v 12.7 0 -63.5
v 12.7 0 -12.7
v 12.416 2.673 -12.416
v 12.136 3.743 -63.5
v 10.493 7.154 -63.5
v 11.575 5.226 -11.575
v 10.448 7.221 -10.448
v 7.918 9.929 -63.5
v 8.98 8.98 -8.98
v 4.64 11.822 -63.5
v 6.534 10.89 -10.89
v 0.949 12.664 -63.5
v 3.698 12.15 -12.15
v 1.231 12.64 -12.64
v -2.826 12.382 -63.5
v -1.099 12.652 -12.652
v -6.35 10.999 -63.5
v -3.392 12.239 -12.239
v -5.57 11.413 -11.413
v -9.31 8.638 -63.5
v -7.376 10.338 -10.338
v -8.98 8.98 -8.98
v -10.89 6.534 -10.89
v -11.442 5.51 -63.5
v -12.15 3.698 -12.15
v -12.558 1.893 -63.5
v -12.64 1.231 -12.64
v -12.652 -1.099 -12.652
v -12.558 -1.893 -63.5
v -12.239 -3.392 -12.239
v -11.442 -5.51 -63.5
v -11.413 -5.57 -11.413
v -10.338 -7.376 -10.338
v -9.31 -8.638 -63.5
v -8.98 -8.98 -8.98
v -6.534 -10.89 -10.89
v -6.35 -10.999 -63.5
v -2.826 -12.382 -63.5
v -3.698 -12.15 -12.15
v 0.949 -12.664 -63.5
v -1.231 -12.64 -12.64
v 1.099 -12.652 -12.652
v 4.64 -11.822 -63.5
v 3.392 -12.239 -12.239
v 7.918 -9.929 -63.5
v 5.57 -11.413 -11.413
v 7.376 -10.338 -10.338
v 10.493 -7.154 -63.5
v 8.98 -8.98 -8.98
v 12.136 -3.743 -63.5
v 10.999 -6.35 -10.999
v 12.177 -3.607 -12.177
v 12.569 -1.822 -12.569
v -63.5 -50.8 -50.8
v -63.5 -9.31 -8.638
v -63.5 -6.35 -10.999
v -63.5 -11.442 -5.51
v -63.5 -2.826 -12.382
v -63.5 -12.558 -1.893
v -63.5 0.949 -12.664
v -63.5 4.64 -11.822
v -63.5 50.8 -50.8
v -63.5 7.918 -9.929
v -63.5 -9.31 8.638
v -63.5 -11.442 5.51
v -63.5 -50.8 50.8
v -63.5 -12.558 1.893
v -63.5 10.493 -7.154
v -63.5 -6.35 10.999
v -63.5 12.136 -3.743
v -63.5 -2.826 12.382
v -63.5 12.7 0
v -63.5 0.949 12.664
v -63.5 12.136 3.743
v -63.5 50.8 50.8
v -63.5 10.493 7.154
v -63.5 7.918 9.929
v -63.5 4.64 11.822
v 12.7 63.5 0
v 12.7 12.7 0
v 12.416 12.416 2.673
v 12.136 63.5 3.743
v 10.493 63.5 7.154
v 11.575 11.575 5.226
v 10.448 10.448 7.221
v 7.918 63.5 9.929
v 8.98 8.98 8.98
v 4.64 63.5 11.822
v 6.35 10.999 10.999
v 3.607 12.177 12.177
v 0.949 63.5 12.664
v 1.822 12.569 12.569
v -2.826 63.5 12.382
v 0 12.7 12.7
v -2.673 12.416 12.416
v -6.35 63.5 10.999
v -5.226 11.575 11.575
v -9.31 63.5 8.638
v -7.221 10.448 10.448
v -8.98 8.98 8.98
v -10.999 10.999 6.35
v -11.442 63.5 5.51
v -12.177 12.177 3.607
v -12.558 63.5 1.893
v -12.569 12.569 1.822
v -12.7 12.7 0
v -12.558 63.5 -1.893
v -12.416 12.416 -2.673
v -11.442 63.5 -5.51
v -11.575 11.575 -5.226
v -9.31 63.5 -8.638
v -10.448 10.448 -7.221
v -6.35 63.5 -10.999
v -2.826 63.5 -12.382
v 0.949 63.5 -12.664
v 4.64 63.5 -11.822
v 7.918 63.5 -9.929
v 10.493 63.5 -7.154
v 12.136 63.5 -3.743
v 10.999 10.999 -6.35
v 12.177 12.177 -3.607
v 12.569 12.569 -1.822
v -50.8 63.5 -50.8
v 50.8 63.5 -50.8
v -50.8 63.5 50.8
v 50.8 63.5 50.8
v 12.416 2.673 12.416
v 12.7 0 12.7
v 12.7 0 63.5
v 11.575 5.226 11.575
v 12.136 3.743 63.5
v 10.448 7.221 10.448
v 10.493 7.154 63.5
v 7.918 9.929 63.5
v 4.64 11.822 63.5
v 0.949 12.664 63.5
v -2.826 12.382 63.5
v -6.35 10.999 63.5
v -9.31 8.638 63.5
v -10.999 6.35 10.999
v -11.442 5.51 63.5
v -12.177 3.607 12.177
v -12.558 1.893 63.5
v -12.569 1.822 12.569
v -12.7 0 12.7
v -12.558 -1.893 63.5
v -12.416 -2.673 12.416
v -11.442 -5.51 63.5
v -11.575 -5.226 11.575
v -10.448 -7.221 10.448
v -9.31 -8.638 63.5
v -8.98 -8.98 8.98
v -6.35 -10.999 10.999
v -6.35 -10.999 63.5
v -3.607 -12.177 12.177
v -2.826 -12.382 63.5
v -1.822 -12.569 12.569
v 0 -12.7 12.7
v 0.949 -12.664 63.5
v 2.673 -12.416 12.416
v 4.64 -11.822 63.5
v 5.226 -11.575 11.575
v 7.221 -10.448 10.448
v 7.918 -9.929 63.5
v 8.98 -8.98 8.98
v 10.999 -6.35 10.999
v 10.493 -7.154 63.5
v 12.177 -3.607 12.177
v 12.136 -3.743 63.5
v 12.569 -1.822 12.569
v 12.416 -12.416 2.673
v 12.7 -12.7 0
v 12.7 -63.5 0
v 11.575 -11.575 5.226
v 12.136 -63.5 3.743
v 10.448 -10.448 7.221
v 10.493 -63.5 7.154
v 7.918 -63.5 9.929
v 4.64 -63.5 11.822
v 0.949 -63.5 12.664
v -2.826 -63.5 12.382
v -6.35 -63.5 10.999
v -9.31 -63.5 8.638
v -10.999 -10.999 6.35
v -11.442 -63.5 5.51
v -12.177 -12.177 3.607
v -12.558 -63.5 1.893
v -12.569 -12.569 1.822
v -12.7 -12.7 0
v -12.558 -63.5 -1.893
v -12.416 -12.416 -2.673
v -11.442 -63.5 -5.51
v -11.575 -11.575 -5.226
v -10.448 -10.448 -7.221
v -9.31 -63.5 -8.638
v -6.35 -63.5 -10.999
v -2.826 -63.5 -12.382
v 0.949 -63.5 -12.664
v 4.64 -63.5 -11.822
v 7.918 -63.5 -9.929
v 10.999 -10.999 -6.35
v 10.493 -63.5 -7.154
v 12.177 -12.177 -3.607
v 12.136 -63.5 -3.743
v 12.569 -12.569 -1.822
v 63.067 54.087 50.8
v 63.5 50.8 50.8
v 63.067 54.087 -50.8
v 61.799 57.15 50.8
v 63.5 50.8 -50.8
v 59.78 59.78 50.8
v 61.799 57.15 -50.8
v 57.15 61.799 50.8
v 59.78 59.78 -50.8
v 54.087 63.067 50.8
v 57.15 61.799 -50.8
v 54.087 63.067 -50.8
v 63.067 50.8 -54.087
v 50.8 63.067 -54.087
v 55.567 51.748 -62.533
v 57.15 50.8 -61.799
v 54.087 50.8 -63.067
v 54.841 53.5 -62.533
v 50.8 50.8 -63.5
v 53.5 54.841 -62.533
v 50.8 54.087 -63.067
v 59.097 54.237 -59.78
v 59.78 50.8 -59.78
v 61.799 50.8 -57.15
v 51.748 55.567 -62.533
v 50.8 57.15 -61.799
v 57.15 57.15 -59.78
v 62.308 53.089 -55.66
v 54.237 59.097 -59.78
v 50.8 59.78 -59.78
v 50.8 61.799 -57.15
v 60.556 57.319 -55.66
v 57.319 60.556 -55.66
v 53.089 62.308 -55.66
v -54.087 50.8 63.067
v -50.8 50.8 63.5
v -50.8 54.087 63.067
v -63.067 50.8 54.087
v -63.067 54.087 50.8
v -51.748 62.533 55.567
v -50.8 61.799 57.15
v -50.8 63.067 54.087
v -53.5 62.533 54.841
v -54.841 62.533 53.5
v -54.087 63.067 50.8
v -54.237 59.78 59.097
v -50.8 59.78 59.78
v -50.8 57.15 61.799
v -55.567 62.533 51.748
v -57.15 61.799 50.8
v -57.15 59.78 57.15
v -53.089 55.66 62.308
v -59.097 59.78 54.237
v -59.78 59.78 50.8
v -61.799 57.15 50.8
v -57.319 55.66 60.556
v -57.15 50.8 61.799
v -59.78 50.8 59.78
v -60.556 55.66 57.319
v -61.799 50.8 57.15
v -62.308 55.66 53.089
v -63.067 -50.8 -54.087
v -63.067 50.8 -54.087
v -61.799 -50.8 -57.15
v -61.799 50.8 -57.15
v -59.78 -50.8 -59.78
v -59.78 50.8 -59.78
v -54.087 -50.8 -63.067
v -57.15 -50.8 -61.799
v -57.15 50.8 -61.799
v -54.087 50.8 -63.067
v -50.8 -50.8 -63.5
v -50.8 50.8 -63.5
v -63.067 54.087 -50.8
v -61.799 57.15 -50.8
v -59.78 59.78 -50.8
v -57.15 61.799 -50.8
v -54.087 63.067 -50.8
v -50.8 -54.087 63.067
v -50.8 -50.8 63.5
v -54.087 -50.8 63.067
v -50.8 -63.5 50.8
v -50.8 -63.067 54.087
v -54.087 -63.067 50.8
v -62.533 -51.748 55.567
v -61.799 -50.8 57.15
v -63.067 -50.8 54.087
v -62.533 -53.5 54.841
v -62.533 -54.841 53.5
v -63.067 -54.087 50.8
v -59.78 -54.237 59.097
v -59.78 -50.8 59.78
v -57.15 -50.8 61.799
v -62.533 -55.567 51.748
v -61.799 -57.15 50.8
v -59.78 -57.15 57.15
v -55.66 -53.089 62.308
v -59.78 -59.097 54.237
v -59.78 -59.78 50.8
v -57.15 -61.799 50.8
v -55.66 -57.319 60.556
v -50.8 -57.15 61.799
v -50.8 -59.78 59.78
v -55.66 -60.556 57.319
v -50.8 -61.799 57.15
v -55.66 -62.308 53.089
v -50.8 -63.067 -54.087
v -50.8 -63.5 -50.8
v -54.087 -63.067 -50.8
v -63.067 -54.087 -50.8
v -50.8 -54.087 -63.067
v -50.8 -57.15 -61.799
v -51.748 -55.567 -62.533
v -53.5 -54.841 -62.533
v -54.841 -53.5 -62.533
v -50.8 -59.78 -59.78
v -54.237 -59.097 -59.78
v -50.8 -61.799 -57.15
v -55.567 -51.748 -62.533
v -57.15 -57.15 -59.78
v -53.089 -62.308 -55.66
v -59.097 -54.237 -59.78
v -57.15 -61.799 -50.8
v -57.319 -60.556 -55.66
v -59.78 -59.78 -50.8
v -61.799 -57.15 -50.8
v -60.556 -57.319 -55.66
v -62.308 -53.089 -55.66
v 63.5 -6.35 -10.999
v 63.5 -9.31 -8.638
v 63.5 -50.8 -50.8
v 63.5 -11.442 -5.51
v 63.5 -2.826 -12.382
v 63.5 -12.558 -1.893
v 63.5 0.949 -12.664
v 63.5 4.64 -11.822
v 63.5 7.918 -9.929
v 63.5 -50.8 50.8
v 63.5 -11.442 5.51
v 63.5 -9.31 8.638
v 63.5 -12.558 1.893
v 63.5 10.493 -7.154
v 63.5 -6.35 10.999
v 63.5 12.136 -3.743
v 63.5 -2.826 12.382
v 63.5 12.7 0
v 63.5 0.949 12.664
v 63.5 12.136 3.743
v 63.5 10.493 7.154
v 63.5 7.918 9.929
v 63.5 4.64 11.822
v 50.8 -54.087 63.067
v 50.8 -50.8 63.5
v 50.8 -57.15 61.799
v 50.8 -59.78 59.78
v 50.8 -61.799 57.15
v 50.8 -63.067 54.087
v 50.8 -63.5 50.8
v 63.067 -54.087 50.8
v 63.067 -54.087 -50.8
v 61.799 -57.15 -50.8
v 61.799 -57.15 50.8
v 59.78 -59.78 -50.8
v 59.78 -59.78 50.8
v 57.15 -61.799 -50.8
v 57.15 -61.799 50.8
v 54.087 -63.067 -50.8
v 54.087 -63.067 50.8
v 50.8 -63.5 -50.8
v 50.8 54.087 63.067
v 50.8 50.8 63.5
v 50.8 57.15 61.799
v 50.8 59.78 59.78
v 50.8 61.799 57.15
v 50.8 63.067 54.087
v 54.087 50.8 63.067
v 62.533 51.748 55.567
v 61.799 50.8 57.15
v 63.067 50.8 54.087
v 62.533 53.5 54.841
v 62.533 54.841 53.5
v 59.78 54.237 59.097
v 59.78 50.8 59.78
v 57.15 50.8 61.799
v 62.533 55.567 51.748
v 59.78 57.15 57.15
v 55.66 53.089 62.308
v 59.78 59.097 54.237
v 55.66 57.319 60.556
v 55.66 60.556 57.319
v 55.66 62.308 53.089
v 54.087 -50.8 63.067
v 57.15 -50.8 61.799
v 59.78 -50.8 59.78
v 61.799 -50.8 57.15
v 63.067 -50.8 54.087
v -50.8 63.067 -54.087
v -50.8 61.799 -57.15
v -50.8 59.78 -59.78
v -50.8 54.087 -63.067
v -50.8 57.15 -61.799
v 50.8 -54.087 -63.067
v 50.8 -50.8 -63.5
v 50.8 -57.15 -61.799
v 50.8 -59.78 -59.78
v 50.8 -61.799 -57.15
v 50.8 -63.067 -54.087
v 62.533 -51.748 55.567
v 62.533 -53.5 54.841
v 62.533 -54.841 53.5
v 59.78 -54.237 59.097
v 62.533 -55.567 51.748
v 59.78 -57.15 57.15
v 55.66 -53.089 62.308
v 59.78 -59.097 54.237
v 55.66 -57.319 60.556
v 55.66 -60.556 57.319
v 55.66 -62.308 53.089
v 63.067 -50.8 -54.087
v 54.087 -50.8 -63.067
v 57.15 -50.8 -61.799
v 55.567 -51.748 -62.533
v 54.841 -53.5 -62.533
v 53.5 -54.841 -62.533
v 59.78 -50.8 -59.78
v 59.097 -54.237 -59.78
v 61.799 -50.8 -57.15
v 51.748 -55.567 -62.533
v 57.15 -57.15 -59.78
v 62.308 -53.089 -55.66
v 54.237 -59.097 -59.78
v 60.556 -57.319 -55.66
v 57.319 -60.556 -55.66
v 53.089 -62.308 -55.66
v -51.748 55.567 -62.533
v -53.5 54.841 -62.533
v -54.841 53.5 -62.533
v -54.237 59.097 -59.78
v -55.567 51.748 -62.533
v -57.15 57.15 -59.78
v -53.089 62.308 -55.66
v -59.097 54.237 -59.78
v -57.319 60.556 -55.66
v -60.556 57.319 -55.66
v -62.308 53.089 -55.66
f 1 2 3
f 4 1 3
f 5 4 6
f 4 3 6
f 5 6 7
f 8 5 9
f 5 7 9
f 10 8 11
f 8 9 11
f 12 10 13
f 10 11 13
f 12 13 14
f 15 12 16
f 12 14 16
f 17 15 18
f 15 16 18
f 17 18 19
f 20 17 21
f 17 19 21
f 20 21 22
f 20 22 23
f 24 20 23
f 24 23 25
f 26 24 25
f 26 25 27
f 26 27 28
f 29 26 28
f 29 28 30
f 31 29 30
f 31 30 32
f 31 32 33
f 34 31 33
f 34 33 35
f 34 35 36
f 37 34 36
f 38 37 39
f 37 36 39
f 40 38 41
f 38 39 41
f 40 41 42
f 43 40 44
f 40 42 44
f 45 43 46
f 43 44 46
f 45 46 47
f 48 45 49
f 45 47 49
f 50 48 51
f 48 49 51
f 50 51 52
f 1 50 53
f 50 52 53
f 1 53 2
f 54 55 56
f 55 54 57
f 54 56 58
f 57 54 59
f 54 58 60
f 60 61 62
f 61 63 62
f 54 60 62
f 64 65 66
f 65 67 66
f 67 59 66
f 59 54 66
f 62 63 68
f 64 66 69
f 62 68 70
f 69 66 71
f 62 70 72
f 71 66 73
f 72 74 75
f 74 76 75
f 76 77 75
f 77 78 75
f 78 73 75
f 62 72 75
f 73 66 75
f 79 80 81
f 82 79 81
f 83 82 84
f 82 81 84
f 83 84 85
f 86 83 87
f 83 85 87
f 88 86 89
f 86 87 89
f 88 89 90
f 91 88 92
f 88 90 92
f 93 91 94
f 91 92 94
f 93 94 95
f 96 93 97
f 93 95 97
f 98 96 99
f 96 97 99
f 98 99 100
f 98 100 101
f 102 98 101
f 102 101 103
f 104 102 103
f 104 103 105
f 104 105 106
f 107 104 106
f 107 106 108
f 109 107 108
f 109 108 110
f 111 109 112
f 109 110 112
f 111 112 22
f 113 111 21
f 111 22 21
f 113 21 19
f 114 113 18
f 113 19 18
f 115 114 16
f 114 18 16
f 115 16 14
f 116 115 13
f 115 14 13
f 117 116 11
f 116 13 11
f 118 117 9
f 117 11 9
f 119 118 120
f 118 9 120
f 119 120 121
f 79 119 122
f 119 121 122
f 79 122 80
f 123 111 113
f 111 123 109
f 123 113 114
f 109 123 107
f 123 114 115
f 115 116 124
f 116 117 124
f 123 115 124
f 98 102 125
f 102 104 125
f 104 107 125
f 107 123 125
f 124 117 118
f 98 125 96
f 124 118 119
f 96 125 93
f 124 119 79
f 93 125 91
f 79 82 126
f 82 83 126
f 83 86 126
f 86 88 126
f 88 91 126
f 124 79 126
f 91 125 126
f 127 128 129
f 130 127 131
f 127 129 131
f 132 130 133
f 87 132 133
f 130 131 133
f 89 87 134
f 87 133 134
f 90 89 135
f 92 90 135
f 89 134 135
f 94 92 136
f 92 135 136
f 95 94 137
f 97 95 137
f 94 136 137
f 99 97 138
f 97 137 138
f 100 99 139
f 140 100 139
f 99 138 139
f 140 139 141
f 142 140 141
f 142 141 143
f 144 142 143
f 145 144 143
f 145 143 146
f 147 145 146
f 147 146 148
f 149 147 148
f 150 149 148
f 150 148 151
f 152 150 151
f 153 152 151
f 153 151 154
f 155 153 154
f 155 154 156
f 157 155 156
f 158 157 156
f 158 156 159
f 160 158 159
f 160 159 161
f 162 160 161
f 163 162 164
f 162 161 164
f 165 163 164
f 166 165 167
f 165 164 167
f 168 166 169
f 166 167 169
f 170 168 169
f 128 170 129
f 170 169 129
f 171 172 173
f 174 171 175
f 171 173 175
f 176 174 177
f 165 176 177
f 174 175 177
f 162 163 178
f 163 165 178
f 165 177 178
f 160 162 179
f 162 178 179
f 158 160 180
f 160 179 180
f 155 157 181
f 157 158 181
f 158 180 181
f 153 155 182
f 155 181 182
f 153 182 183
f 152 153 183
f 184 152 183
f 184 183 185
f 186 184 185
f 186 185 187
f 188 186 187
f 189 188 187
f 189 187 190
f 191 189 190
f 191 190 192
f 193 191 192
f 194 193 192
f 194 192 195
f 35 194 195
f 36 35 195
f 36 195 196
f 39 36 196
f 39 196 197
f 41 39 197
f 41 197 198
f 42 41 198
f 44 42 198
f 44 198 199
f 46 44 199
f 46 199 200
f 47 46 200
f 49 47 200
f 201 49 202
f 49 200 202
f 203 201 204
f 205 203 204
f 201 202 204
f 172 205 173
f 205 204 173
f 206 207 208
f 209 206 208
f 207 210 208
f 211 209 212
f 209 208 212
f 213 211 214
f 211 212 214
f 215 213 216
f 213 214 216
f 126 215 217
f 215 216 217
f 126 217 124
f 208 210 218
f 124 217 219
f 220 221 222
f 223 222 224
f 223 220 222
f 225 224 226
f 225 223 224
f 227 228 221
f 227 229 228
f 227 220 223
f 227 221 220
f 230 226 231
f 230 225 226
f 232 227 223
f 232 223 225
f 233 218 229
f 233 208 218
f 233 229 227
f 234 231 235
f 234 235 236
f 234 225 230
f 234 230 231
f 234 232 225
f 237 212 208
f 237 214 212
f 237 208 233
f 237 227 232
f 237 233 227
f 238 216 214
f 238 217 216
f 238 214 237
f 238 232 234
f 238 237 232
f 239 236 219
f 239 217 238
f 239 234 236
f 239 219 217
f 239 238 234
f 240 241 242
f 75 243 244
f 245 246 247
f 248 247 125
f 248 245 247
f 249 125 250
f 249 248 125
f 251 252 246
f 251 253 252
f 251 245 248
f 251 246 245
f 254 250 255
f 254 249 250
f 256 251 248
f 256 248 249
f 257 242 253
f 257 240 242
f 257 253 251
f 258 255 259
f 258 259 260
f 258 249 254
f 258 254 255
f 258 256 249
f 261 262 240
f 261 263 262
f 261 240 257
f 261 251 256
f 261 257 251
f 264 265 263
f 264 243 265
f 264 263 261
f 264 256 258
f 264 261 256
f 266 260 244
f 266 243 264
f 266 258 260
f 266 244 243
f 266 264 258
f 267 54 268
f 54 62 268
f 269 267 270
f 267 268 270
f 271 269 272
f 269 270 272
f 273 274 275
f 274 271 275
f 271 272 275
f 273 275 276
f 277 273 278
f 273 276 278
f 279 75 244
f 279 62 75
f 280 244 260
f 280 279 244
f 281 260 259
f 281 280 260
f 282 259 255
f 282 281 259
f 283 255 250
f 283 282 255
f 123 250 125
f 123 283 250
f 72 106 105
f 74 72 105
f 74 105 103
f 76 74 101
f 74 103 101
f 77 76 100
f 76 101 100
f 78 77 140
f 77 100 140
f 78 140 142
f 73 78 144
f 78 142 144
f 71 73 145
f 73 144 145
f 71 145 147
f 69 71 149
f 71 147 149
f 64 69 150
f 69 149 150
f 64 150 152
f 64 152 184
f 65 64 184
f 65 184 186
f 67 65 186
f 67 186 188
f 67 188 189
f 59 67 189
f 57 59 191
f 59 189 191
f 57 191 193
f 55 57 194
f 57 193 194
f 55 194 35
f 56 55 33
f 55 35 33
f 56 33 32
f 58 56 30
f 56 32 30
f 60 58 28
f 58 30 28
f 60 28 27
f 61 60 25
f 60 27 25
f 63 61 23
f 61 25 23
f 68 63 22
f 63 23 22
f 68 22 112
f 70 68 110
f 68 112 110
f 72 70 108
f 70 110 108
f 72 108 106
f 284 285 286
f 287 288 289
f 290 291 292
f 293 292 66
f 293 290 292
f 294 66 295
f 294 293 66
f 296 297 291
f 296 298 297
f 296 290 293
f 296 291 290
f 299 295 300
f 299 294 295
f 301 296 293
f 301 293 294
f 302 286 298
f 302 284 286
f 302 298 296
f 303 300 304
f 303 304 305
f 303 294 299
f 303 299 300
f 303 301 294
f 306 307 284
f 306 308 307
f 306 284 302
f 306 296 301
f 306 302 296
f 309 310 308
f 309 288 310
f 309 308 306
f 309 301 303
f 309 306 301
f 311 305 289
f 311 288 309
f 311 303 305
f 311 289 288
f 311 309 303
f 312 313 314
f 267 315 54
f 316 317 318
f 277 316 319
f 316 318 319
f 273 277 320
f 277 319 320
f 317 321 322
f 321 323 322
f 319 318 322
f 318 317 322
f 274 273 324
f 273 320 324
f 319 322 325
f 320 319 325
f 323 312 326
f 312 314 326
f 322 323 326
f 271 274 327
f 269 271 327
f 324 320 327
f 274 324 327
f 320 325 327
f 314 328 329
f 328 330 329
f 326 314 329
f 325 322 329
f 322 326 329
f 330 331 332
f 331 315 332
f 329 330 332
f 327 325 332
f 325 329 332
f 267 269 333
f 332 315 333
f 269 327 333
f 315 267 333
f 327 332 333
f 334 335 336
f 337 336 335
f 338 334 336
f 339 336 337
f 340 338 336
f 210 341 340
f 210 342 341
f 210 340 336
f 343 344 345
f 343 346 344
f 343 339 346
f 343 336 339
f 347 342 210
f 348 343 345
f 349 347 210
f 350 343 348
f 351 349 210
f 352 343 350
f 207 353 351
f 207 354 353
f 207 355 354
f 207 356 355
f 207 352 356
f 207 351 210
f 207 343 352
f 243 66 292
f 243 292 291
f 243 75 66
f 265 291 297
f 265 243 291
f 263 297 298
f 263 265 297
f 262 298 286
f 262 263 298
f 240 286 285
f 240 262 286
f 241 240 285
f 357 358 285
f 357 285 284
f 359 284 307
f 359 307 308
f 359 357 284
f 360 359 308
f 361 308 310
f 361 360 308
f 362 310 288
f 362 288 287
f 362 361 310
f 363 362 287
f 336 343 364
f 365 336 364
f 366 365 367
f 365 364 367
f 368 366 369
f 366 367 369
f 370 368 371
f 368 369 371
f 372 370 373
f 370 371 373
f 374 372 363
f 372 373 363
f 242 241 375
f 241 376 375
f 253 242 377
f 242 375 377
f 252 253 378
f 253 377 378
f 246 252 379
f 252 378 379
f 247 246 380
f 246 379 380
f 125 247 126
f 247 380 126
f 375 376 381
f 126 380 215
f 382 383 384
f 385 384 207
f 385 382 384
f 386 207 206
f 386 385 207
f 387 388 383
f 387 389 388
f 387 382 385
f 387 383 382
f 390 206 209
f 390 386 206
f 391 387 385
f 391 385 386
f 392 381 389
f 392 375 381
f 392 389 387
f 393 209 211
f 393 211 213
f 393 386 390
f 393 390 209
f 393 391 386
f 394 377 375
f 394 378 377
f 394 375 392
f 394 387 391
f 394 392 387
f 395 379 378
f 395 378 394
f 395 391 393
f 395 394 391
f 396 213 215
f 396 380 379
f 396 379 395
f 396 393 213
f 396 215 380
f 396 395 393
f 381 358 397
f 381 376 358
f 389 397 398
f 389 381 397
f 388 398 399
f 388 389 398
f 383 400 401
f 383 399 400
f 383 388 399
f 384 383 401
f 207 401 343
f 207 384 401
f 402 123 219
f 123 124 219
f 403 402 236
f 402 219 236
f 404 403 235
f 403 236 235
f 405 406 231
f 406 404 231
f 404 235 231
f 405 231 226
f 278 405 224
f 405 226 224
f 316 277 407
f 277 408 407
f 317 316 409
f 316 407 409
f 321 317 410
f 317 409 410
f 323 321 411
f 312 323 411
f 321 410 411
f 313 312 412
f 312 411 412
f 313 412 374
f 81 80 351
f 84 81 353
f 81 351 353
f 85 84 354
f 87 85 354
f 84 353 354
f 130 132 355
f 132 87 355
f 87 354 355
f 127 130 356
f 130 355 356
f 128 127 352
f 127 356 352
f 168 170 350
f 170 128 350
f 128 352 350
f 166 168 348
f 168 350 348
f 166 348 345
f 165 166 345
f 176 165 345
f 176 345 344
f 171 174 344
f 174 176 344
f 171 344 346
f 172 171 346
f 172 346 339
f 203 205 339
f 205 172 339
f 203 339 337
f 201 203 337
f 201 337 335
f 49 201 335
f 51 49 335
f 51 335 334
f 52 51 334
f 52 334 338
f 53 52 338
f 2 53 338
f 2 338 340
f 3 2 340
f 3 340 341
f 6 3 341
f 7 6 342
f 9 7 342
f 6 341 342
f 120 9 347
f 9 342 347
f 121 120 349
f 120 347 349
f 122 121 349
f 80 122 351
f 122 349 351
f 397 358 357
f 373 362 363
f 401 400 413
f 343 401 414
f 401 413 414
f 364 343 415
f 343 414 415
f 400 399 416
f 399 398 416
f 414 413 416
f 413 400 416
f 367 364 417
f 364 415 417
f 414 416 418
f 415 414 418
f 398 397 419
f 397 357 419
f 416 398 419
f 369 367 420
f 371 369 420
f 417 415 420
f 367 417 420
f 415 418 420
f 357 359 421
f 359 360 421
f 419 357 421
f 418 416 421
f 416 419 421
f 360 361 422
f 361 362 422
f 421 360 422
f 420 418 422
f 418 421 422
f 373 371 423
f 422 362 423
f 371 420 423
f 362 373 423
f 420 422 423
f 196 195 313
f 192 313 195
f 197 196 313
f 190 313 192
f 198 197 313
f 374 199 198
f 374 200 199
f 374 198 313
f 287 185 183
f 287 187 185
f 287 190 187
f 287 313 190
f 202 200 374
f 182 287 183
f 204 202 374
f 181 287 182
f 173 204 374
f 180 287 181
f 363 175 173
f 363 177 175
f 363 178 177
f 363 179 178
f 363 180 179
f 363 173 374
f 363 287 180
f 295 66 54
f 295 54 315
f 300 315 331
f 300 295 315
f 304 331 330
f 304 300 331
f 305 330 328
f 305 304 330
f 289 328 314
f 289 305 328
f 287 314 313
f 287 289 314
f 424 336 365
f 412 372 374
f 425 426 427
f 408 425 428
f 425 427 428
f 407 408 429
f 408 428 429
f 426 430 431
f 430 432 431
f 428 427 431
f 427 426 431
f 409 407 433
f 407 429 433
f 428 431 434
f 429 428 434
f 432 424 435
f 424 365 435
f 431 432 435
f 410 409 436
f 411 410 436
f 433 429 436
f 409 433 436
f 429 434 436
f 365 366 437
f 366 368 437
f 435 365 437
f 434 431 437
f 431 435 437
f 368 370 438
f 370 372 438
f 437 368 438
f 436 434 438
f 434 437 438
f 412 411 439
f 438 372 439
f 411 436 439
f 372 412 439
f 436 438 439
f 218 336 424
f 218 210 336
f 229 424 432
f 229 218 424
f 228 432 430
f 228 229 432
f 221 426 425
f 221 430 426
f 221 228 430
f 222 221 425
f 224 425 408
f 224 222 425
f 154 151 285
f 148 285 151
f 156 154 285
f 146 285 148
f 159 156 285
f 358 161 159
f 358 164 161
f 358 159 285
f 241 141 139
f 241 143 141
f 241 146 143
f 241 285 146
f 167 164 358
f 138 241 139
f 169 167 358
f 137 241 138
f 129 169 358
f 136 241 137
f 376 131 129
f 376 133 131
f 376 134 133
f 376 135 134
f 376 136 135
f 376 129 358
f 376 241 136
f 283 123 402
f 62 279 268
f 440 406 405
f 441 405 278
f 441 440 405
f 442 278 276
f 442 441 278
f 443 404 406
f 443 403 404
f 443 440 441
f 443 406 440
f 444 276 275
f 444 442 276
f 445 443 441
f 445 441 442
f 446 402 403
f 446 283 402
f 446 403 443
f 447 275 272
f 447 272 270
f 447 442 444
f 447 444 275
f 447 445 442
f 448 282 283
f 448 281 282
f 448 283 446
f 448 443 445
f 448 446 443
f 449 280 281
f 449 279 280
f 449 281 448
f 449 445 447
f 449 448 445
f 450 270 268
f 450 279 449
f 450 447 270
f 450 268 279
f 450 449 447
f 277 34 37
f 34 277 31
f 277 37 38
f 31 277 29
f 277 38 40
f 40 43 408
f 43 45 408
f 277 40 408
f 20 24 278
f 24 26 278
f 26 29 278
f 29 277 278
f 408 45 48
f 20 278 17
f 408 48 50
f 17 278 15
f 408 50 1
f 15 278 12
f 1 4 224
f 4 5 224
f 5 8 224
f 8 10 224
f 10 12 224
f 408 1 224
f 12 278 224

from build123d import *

# Parameters (mm, degrees)
F0_W     = 127
F0_H     = 127
F1_DEPTH = 63.5
F2_DEPTH = 63.5
F3_R     = 12.7
F4_R     = 12.7
F5_DEPTH = 127
F6_R     = 12.7
F7_DEPTH = 127
F8_R     = 12.7
F9_DEPTH = 381


with BuildPart() as f1:
    # F0 (on Top) → F1 (new body)
    with BuildSketch(Plane.XY):
        Rectangle(F0_W, F0_H)
    extrude(amount=F1_DEPTH)

    # F2 (add): faces of the model
    f2_faces = [f1.faces().sort_by_distance(p)[0] for p in [
        (0, 0, 0),
        (0, 0, 63.5),
    ]]
    extrude(f2_faces, amount=F2_DEPTH, dir=(0, 0, -1))

    # F3
    f3_edges = [f1.edges().sort_by_distance(p)[0] for p in [
        (0, -63.5, 63.5),
        (-63.5, 0, 63.5),
        (-63.5, -63.5, 0),
        (0, 63.5, 63.5),
        (63.5, 0, 63.5),
        (63.5, 63.5, 0),
        (63.5, -63.5, 0),
        (63.5, 0, -63.5),
        (0, -63.5, -63.5),
        (-63.5, 63.5, 0),
        (0, 63.5, -63.5),
        (-63.5, 0, -63.5),
    ]]
    fillet(f3_edges, radius=F3_R)

    # F4 (on face) → F5 (cut)
    with BuildSketch(Plane.XY.offset(63.5)):
        Circle(F4_R)
    extrude(amount=-F5_DEPTH, mode=Mode.SUBTRACT)

    # F6 (on face) → F7 (cut)
    with BuildSketch(Plane.XZ.offset(63.5)):
        Circle(F6_R)
    extrude(amount=-F7_DEPTH, mode=Mode.SUBTRACT)

    # F8 (on face) → F9 (cut)
    with BuildSketch(Plane.YZ.offset(63.5)):
        Circle(F8_R)
    extrude(amount=-F9_DEPTH, mode=Mode.SUBTRACT)


solid = f1.part
